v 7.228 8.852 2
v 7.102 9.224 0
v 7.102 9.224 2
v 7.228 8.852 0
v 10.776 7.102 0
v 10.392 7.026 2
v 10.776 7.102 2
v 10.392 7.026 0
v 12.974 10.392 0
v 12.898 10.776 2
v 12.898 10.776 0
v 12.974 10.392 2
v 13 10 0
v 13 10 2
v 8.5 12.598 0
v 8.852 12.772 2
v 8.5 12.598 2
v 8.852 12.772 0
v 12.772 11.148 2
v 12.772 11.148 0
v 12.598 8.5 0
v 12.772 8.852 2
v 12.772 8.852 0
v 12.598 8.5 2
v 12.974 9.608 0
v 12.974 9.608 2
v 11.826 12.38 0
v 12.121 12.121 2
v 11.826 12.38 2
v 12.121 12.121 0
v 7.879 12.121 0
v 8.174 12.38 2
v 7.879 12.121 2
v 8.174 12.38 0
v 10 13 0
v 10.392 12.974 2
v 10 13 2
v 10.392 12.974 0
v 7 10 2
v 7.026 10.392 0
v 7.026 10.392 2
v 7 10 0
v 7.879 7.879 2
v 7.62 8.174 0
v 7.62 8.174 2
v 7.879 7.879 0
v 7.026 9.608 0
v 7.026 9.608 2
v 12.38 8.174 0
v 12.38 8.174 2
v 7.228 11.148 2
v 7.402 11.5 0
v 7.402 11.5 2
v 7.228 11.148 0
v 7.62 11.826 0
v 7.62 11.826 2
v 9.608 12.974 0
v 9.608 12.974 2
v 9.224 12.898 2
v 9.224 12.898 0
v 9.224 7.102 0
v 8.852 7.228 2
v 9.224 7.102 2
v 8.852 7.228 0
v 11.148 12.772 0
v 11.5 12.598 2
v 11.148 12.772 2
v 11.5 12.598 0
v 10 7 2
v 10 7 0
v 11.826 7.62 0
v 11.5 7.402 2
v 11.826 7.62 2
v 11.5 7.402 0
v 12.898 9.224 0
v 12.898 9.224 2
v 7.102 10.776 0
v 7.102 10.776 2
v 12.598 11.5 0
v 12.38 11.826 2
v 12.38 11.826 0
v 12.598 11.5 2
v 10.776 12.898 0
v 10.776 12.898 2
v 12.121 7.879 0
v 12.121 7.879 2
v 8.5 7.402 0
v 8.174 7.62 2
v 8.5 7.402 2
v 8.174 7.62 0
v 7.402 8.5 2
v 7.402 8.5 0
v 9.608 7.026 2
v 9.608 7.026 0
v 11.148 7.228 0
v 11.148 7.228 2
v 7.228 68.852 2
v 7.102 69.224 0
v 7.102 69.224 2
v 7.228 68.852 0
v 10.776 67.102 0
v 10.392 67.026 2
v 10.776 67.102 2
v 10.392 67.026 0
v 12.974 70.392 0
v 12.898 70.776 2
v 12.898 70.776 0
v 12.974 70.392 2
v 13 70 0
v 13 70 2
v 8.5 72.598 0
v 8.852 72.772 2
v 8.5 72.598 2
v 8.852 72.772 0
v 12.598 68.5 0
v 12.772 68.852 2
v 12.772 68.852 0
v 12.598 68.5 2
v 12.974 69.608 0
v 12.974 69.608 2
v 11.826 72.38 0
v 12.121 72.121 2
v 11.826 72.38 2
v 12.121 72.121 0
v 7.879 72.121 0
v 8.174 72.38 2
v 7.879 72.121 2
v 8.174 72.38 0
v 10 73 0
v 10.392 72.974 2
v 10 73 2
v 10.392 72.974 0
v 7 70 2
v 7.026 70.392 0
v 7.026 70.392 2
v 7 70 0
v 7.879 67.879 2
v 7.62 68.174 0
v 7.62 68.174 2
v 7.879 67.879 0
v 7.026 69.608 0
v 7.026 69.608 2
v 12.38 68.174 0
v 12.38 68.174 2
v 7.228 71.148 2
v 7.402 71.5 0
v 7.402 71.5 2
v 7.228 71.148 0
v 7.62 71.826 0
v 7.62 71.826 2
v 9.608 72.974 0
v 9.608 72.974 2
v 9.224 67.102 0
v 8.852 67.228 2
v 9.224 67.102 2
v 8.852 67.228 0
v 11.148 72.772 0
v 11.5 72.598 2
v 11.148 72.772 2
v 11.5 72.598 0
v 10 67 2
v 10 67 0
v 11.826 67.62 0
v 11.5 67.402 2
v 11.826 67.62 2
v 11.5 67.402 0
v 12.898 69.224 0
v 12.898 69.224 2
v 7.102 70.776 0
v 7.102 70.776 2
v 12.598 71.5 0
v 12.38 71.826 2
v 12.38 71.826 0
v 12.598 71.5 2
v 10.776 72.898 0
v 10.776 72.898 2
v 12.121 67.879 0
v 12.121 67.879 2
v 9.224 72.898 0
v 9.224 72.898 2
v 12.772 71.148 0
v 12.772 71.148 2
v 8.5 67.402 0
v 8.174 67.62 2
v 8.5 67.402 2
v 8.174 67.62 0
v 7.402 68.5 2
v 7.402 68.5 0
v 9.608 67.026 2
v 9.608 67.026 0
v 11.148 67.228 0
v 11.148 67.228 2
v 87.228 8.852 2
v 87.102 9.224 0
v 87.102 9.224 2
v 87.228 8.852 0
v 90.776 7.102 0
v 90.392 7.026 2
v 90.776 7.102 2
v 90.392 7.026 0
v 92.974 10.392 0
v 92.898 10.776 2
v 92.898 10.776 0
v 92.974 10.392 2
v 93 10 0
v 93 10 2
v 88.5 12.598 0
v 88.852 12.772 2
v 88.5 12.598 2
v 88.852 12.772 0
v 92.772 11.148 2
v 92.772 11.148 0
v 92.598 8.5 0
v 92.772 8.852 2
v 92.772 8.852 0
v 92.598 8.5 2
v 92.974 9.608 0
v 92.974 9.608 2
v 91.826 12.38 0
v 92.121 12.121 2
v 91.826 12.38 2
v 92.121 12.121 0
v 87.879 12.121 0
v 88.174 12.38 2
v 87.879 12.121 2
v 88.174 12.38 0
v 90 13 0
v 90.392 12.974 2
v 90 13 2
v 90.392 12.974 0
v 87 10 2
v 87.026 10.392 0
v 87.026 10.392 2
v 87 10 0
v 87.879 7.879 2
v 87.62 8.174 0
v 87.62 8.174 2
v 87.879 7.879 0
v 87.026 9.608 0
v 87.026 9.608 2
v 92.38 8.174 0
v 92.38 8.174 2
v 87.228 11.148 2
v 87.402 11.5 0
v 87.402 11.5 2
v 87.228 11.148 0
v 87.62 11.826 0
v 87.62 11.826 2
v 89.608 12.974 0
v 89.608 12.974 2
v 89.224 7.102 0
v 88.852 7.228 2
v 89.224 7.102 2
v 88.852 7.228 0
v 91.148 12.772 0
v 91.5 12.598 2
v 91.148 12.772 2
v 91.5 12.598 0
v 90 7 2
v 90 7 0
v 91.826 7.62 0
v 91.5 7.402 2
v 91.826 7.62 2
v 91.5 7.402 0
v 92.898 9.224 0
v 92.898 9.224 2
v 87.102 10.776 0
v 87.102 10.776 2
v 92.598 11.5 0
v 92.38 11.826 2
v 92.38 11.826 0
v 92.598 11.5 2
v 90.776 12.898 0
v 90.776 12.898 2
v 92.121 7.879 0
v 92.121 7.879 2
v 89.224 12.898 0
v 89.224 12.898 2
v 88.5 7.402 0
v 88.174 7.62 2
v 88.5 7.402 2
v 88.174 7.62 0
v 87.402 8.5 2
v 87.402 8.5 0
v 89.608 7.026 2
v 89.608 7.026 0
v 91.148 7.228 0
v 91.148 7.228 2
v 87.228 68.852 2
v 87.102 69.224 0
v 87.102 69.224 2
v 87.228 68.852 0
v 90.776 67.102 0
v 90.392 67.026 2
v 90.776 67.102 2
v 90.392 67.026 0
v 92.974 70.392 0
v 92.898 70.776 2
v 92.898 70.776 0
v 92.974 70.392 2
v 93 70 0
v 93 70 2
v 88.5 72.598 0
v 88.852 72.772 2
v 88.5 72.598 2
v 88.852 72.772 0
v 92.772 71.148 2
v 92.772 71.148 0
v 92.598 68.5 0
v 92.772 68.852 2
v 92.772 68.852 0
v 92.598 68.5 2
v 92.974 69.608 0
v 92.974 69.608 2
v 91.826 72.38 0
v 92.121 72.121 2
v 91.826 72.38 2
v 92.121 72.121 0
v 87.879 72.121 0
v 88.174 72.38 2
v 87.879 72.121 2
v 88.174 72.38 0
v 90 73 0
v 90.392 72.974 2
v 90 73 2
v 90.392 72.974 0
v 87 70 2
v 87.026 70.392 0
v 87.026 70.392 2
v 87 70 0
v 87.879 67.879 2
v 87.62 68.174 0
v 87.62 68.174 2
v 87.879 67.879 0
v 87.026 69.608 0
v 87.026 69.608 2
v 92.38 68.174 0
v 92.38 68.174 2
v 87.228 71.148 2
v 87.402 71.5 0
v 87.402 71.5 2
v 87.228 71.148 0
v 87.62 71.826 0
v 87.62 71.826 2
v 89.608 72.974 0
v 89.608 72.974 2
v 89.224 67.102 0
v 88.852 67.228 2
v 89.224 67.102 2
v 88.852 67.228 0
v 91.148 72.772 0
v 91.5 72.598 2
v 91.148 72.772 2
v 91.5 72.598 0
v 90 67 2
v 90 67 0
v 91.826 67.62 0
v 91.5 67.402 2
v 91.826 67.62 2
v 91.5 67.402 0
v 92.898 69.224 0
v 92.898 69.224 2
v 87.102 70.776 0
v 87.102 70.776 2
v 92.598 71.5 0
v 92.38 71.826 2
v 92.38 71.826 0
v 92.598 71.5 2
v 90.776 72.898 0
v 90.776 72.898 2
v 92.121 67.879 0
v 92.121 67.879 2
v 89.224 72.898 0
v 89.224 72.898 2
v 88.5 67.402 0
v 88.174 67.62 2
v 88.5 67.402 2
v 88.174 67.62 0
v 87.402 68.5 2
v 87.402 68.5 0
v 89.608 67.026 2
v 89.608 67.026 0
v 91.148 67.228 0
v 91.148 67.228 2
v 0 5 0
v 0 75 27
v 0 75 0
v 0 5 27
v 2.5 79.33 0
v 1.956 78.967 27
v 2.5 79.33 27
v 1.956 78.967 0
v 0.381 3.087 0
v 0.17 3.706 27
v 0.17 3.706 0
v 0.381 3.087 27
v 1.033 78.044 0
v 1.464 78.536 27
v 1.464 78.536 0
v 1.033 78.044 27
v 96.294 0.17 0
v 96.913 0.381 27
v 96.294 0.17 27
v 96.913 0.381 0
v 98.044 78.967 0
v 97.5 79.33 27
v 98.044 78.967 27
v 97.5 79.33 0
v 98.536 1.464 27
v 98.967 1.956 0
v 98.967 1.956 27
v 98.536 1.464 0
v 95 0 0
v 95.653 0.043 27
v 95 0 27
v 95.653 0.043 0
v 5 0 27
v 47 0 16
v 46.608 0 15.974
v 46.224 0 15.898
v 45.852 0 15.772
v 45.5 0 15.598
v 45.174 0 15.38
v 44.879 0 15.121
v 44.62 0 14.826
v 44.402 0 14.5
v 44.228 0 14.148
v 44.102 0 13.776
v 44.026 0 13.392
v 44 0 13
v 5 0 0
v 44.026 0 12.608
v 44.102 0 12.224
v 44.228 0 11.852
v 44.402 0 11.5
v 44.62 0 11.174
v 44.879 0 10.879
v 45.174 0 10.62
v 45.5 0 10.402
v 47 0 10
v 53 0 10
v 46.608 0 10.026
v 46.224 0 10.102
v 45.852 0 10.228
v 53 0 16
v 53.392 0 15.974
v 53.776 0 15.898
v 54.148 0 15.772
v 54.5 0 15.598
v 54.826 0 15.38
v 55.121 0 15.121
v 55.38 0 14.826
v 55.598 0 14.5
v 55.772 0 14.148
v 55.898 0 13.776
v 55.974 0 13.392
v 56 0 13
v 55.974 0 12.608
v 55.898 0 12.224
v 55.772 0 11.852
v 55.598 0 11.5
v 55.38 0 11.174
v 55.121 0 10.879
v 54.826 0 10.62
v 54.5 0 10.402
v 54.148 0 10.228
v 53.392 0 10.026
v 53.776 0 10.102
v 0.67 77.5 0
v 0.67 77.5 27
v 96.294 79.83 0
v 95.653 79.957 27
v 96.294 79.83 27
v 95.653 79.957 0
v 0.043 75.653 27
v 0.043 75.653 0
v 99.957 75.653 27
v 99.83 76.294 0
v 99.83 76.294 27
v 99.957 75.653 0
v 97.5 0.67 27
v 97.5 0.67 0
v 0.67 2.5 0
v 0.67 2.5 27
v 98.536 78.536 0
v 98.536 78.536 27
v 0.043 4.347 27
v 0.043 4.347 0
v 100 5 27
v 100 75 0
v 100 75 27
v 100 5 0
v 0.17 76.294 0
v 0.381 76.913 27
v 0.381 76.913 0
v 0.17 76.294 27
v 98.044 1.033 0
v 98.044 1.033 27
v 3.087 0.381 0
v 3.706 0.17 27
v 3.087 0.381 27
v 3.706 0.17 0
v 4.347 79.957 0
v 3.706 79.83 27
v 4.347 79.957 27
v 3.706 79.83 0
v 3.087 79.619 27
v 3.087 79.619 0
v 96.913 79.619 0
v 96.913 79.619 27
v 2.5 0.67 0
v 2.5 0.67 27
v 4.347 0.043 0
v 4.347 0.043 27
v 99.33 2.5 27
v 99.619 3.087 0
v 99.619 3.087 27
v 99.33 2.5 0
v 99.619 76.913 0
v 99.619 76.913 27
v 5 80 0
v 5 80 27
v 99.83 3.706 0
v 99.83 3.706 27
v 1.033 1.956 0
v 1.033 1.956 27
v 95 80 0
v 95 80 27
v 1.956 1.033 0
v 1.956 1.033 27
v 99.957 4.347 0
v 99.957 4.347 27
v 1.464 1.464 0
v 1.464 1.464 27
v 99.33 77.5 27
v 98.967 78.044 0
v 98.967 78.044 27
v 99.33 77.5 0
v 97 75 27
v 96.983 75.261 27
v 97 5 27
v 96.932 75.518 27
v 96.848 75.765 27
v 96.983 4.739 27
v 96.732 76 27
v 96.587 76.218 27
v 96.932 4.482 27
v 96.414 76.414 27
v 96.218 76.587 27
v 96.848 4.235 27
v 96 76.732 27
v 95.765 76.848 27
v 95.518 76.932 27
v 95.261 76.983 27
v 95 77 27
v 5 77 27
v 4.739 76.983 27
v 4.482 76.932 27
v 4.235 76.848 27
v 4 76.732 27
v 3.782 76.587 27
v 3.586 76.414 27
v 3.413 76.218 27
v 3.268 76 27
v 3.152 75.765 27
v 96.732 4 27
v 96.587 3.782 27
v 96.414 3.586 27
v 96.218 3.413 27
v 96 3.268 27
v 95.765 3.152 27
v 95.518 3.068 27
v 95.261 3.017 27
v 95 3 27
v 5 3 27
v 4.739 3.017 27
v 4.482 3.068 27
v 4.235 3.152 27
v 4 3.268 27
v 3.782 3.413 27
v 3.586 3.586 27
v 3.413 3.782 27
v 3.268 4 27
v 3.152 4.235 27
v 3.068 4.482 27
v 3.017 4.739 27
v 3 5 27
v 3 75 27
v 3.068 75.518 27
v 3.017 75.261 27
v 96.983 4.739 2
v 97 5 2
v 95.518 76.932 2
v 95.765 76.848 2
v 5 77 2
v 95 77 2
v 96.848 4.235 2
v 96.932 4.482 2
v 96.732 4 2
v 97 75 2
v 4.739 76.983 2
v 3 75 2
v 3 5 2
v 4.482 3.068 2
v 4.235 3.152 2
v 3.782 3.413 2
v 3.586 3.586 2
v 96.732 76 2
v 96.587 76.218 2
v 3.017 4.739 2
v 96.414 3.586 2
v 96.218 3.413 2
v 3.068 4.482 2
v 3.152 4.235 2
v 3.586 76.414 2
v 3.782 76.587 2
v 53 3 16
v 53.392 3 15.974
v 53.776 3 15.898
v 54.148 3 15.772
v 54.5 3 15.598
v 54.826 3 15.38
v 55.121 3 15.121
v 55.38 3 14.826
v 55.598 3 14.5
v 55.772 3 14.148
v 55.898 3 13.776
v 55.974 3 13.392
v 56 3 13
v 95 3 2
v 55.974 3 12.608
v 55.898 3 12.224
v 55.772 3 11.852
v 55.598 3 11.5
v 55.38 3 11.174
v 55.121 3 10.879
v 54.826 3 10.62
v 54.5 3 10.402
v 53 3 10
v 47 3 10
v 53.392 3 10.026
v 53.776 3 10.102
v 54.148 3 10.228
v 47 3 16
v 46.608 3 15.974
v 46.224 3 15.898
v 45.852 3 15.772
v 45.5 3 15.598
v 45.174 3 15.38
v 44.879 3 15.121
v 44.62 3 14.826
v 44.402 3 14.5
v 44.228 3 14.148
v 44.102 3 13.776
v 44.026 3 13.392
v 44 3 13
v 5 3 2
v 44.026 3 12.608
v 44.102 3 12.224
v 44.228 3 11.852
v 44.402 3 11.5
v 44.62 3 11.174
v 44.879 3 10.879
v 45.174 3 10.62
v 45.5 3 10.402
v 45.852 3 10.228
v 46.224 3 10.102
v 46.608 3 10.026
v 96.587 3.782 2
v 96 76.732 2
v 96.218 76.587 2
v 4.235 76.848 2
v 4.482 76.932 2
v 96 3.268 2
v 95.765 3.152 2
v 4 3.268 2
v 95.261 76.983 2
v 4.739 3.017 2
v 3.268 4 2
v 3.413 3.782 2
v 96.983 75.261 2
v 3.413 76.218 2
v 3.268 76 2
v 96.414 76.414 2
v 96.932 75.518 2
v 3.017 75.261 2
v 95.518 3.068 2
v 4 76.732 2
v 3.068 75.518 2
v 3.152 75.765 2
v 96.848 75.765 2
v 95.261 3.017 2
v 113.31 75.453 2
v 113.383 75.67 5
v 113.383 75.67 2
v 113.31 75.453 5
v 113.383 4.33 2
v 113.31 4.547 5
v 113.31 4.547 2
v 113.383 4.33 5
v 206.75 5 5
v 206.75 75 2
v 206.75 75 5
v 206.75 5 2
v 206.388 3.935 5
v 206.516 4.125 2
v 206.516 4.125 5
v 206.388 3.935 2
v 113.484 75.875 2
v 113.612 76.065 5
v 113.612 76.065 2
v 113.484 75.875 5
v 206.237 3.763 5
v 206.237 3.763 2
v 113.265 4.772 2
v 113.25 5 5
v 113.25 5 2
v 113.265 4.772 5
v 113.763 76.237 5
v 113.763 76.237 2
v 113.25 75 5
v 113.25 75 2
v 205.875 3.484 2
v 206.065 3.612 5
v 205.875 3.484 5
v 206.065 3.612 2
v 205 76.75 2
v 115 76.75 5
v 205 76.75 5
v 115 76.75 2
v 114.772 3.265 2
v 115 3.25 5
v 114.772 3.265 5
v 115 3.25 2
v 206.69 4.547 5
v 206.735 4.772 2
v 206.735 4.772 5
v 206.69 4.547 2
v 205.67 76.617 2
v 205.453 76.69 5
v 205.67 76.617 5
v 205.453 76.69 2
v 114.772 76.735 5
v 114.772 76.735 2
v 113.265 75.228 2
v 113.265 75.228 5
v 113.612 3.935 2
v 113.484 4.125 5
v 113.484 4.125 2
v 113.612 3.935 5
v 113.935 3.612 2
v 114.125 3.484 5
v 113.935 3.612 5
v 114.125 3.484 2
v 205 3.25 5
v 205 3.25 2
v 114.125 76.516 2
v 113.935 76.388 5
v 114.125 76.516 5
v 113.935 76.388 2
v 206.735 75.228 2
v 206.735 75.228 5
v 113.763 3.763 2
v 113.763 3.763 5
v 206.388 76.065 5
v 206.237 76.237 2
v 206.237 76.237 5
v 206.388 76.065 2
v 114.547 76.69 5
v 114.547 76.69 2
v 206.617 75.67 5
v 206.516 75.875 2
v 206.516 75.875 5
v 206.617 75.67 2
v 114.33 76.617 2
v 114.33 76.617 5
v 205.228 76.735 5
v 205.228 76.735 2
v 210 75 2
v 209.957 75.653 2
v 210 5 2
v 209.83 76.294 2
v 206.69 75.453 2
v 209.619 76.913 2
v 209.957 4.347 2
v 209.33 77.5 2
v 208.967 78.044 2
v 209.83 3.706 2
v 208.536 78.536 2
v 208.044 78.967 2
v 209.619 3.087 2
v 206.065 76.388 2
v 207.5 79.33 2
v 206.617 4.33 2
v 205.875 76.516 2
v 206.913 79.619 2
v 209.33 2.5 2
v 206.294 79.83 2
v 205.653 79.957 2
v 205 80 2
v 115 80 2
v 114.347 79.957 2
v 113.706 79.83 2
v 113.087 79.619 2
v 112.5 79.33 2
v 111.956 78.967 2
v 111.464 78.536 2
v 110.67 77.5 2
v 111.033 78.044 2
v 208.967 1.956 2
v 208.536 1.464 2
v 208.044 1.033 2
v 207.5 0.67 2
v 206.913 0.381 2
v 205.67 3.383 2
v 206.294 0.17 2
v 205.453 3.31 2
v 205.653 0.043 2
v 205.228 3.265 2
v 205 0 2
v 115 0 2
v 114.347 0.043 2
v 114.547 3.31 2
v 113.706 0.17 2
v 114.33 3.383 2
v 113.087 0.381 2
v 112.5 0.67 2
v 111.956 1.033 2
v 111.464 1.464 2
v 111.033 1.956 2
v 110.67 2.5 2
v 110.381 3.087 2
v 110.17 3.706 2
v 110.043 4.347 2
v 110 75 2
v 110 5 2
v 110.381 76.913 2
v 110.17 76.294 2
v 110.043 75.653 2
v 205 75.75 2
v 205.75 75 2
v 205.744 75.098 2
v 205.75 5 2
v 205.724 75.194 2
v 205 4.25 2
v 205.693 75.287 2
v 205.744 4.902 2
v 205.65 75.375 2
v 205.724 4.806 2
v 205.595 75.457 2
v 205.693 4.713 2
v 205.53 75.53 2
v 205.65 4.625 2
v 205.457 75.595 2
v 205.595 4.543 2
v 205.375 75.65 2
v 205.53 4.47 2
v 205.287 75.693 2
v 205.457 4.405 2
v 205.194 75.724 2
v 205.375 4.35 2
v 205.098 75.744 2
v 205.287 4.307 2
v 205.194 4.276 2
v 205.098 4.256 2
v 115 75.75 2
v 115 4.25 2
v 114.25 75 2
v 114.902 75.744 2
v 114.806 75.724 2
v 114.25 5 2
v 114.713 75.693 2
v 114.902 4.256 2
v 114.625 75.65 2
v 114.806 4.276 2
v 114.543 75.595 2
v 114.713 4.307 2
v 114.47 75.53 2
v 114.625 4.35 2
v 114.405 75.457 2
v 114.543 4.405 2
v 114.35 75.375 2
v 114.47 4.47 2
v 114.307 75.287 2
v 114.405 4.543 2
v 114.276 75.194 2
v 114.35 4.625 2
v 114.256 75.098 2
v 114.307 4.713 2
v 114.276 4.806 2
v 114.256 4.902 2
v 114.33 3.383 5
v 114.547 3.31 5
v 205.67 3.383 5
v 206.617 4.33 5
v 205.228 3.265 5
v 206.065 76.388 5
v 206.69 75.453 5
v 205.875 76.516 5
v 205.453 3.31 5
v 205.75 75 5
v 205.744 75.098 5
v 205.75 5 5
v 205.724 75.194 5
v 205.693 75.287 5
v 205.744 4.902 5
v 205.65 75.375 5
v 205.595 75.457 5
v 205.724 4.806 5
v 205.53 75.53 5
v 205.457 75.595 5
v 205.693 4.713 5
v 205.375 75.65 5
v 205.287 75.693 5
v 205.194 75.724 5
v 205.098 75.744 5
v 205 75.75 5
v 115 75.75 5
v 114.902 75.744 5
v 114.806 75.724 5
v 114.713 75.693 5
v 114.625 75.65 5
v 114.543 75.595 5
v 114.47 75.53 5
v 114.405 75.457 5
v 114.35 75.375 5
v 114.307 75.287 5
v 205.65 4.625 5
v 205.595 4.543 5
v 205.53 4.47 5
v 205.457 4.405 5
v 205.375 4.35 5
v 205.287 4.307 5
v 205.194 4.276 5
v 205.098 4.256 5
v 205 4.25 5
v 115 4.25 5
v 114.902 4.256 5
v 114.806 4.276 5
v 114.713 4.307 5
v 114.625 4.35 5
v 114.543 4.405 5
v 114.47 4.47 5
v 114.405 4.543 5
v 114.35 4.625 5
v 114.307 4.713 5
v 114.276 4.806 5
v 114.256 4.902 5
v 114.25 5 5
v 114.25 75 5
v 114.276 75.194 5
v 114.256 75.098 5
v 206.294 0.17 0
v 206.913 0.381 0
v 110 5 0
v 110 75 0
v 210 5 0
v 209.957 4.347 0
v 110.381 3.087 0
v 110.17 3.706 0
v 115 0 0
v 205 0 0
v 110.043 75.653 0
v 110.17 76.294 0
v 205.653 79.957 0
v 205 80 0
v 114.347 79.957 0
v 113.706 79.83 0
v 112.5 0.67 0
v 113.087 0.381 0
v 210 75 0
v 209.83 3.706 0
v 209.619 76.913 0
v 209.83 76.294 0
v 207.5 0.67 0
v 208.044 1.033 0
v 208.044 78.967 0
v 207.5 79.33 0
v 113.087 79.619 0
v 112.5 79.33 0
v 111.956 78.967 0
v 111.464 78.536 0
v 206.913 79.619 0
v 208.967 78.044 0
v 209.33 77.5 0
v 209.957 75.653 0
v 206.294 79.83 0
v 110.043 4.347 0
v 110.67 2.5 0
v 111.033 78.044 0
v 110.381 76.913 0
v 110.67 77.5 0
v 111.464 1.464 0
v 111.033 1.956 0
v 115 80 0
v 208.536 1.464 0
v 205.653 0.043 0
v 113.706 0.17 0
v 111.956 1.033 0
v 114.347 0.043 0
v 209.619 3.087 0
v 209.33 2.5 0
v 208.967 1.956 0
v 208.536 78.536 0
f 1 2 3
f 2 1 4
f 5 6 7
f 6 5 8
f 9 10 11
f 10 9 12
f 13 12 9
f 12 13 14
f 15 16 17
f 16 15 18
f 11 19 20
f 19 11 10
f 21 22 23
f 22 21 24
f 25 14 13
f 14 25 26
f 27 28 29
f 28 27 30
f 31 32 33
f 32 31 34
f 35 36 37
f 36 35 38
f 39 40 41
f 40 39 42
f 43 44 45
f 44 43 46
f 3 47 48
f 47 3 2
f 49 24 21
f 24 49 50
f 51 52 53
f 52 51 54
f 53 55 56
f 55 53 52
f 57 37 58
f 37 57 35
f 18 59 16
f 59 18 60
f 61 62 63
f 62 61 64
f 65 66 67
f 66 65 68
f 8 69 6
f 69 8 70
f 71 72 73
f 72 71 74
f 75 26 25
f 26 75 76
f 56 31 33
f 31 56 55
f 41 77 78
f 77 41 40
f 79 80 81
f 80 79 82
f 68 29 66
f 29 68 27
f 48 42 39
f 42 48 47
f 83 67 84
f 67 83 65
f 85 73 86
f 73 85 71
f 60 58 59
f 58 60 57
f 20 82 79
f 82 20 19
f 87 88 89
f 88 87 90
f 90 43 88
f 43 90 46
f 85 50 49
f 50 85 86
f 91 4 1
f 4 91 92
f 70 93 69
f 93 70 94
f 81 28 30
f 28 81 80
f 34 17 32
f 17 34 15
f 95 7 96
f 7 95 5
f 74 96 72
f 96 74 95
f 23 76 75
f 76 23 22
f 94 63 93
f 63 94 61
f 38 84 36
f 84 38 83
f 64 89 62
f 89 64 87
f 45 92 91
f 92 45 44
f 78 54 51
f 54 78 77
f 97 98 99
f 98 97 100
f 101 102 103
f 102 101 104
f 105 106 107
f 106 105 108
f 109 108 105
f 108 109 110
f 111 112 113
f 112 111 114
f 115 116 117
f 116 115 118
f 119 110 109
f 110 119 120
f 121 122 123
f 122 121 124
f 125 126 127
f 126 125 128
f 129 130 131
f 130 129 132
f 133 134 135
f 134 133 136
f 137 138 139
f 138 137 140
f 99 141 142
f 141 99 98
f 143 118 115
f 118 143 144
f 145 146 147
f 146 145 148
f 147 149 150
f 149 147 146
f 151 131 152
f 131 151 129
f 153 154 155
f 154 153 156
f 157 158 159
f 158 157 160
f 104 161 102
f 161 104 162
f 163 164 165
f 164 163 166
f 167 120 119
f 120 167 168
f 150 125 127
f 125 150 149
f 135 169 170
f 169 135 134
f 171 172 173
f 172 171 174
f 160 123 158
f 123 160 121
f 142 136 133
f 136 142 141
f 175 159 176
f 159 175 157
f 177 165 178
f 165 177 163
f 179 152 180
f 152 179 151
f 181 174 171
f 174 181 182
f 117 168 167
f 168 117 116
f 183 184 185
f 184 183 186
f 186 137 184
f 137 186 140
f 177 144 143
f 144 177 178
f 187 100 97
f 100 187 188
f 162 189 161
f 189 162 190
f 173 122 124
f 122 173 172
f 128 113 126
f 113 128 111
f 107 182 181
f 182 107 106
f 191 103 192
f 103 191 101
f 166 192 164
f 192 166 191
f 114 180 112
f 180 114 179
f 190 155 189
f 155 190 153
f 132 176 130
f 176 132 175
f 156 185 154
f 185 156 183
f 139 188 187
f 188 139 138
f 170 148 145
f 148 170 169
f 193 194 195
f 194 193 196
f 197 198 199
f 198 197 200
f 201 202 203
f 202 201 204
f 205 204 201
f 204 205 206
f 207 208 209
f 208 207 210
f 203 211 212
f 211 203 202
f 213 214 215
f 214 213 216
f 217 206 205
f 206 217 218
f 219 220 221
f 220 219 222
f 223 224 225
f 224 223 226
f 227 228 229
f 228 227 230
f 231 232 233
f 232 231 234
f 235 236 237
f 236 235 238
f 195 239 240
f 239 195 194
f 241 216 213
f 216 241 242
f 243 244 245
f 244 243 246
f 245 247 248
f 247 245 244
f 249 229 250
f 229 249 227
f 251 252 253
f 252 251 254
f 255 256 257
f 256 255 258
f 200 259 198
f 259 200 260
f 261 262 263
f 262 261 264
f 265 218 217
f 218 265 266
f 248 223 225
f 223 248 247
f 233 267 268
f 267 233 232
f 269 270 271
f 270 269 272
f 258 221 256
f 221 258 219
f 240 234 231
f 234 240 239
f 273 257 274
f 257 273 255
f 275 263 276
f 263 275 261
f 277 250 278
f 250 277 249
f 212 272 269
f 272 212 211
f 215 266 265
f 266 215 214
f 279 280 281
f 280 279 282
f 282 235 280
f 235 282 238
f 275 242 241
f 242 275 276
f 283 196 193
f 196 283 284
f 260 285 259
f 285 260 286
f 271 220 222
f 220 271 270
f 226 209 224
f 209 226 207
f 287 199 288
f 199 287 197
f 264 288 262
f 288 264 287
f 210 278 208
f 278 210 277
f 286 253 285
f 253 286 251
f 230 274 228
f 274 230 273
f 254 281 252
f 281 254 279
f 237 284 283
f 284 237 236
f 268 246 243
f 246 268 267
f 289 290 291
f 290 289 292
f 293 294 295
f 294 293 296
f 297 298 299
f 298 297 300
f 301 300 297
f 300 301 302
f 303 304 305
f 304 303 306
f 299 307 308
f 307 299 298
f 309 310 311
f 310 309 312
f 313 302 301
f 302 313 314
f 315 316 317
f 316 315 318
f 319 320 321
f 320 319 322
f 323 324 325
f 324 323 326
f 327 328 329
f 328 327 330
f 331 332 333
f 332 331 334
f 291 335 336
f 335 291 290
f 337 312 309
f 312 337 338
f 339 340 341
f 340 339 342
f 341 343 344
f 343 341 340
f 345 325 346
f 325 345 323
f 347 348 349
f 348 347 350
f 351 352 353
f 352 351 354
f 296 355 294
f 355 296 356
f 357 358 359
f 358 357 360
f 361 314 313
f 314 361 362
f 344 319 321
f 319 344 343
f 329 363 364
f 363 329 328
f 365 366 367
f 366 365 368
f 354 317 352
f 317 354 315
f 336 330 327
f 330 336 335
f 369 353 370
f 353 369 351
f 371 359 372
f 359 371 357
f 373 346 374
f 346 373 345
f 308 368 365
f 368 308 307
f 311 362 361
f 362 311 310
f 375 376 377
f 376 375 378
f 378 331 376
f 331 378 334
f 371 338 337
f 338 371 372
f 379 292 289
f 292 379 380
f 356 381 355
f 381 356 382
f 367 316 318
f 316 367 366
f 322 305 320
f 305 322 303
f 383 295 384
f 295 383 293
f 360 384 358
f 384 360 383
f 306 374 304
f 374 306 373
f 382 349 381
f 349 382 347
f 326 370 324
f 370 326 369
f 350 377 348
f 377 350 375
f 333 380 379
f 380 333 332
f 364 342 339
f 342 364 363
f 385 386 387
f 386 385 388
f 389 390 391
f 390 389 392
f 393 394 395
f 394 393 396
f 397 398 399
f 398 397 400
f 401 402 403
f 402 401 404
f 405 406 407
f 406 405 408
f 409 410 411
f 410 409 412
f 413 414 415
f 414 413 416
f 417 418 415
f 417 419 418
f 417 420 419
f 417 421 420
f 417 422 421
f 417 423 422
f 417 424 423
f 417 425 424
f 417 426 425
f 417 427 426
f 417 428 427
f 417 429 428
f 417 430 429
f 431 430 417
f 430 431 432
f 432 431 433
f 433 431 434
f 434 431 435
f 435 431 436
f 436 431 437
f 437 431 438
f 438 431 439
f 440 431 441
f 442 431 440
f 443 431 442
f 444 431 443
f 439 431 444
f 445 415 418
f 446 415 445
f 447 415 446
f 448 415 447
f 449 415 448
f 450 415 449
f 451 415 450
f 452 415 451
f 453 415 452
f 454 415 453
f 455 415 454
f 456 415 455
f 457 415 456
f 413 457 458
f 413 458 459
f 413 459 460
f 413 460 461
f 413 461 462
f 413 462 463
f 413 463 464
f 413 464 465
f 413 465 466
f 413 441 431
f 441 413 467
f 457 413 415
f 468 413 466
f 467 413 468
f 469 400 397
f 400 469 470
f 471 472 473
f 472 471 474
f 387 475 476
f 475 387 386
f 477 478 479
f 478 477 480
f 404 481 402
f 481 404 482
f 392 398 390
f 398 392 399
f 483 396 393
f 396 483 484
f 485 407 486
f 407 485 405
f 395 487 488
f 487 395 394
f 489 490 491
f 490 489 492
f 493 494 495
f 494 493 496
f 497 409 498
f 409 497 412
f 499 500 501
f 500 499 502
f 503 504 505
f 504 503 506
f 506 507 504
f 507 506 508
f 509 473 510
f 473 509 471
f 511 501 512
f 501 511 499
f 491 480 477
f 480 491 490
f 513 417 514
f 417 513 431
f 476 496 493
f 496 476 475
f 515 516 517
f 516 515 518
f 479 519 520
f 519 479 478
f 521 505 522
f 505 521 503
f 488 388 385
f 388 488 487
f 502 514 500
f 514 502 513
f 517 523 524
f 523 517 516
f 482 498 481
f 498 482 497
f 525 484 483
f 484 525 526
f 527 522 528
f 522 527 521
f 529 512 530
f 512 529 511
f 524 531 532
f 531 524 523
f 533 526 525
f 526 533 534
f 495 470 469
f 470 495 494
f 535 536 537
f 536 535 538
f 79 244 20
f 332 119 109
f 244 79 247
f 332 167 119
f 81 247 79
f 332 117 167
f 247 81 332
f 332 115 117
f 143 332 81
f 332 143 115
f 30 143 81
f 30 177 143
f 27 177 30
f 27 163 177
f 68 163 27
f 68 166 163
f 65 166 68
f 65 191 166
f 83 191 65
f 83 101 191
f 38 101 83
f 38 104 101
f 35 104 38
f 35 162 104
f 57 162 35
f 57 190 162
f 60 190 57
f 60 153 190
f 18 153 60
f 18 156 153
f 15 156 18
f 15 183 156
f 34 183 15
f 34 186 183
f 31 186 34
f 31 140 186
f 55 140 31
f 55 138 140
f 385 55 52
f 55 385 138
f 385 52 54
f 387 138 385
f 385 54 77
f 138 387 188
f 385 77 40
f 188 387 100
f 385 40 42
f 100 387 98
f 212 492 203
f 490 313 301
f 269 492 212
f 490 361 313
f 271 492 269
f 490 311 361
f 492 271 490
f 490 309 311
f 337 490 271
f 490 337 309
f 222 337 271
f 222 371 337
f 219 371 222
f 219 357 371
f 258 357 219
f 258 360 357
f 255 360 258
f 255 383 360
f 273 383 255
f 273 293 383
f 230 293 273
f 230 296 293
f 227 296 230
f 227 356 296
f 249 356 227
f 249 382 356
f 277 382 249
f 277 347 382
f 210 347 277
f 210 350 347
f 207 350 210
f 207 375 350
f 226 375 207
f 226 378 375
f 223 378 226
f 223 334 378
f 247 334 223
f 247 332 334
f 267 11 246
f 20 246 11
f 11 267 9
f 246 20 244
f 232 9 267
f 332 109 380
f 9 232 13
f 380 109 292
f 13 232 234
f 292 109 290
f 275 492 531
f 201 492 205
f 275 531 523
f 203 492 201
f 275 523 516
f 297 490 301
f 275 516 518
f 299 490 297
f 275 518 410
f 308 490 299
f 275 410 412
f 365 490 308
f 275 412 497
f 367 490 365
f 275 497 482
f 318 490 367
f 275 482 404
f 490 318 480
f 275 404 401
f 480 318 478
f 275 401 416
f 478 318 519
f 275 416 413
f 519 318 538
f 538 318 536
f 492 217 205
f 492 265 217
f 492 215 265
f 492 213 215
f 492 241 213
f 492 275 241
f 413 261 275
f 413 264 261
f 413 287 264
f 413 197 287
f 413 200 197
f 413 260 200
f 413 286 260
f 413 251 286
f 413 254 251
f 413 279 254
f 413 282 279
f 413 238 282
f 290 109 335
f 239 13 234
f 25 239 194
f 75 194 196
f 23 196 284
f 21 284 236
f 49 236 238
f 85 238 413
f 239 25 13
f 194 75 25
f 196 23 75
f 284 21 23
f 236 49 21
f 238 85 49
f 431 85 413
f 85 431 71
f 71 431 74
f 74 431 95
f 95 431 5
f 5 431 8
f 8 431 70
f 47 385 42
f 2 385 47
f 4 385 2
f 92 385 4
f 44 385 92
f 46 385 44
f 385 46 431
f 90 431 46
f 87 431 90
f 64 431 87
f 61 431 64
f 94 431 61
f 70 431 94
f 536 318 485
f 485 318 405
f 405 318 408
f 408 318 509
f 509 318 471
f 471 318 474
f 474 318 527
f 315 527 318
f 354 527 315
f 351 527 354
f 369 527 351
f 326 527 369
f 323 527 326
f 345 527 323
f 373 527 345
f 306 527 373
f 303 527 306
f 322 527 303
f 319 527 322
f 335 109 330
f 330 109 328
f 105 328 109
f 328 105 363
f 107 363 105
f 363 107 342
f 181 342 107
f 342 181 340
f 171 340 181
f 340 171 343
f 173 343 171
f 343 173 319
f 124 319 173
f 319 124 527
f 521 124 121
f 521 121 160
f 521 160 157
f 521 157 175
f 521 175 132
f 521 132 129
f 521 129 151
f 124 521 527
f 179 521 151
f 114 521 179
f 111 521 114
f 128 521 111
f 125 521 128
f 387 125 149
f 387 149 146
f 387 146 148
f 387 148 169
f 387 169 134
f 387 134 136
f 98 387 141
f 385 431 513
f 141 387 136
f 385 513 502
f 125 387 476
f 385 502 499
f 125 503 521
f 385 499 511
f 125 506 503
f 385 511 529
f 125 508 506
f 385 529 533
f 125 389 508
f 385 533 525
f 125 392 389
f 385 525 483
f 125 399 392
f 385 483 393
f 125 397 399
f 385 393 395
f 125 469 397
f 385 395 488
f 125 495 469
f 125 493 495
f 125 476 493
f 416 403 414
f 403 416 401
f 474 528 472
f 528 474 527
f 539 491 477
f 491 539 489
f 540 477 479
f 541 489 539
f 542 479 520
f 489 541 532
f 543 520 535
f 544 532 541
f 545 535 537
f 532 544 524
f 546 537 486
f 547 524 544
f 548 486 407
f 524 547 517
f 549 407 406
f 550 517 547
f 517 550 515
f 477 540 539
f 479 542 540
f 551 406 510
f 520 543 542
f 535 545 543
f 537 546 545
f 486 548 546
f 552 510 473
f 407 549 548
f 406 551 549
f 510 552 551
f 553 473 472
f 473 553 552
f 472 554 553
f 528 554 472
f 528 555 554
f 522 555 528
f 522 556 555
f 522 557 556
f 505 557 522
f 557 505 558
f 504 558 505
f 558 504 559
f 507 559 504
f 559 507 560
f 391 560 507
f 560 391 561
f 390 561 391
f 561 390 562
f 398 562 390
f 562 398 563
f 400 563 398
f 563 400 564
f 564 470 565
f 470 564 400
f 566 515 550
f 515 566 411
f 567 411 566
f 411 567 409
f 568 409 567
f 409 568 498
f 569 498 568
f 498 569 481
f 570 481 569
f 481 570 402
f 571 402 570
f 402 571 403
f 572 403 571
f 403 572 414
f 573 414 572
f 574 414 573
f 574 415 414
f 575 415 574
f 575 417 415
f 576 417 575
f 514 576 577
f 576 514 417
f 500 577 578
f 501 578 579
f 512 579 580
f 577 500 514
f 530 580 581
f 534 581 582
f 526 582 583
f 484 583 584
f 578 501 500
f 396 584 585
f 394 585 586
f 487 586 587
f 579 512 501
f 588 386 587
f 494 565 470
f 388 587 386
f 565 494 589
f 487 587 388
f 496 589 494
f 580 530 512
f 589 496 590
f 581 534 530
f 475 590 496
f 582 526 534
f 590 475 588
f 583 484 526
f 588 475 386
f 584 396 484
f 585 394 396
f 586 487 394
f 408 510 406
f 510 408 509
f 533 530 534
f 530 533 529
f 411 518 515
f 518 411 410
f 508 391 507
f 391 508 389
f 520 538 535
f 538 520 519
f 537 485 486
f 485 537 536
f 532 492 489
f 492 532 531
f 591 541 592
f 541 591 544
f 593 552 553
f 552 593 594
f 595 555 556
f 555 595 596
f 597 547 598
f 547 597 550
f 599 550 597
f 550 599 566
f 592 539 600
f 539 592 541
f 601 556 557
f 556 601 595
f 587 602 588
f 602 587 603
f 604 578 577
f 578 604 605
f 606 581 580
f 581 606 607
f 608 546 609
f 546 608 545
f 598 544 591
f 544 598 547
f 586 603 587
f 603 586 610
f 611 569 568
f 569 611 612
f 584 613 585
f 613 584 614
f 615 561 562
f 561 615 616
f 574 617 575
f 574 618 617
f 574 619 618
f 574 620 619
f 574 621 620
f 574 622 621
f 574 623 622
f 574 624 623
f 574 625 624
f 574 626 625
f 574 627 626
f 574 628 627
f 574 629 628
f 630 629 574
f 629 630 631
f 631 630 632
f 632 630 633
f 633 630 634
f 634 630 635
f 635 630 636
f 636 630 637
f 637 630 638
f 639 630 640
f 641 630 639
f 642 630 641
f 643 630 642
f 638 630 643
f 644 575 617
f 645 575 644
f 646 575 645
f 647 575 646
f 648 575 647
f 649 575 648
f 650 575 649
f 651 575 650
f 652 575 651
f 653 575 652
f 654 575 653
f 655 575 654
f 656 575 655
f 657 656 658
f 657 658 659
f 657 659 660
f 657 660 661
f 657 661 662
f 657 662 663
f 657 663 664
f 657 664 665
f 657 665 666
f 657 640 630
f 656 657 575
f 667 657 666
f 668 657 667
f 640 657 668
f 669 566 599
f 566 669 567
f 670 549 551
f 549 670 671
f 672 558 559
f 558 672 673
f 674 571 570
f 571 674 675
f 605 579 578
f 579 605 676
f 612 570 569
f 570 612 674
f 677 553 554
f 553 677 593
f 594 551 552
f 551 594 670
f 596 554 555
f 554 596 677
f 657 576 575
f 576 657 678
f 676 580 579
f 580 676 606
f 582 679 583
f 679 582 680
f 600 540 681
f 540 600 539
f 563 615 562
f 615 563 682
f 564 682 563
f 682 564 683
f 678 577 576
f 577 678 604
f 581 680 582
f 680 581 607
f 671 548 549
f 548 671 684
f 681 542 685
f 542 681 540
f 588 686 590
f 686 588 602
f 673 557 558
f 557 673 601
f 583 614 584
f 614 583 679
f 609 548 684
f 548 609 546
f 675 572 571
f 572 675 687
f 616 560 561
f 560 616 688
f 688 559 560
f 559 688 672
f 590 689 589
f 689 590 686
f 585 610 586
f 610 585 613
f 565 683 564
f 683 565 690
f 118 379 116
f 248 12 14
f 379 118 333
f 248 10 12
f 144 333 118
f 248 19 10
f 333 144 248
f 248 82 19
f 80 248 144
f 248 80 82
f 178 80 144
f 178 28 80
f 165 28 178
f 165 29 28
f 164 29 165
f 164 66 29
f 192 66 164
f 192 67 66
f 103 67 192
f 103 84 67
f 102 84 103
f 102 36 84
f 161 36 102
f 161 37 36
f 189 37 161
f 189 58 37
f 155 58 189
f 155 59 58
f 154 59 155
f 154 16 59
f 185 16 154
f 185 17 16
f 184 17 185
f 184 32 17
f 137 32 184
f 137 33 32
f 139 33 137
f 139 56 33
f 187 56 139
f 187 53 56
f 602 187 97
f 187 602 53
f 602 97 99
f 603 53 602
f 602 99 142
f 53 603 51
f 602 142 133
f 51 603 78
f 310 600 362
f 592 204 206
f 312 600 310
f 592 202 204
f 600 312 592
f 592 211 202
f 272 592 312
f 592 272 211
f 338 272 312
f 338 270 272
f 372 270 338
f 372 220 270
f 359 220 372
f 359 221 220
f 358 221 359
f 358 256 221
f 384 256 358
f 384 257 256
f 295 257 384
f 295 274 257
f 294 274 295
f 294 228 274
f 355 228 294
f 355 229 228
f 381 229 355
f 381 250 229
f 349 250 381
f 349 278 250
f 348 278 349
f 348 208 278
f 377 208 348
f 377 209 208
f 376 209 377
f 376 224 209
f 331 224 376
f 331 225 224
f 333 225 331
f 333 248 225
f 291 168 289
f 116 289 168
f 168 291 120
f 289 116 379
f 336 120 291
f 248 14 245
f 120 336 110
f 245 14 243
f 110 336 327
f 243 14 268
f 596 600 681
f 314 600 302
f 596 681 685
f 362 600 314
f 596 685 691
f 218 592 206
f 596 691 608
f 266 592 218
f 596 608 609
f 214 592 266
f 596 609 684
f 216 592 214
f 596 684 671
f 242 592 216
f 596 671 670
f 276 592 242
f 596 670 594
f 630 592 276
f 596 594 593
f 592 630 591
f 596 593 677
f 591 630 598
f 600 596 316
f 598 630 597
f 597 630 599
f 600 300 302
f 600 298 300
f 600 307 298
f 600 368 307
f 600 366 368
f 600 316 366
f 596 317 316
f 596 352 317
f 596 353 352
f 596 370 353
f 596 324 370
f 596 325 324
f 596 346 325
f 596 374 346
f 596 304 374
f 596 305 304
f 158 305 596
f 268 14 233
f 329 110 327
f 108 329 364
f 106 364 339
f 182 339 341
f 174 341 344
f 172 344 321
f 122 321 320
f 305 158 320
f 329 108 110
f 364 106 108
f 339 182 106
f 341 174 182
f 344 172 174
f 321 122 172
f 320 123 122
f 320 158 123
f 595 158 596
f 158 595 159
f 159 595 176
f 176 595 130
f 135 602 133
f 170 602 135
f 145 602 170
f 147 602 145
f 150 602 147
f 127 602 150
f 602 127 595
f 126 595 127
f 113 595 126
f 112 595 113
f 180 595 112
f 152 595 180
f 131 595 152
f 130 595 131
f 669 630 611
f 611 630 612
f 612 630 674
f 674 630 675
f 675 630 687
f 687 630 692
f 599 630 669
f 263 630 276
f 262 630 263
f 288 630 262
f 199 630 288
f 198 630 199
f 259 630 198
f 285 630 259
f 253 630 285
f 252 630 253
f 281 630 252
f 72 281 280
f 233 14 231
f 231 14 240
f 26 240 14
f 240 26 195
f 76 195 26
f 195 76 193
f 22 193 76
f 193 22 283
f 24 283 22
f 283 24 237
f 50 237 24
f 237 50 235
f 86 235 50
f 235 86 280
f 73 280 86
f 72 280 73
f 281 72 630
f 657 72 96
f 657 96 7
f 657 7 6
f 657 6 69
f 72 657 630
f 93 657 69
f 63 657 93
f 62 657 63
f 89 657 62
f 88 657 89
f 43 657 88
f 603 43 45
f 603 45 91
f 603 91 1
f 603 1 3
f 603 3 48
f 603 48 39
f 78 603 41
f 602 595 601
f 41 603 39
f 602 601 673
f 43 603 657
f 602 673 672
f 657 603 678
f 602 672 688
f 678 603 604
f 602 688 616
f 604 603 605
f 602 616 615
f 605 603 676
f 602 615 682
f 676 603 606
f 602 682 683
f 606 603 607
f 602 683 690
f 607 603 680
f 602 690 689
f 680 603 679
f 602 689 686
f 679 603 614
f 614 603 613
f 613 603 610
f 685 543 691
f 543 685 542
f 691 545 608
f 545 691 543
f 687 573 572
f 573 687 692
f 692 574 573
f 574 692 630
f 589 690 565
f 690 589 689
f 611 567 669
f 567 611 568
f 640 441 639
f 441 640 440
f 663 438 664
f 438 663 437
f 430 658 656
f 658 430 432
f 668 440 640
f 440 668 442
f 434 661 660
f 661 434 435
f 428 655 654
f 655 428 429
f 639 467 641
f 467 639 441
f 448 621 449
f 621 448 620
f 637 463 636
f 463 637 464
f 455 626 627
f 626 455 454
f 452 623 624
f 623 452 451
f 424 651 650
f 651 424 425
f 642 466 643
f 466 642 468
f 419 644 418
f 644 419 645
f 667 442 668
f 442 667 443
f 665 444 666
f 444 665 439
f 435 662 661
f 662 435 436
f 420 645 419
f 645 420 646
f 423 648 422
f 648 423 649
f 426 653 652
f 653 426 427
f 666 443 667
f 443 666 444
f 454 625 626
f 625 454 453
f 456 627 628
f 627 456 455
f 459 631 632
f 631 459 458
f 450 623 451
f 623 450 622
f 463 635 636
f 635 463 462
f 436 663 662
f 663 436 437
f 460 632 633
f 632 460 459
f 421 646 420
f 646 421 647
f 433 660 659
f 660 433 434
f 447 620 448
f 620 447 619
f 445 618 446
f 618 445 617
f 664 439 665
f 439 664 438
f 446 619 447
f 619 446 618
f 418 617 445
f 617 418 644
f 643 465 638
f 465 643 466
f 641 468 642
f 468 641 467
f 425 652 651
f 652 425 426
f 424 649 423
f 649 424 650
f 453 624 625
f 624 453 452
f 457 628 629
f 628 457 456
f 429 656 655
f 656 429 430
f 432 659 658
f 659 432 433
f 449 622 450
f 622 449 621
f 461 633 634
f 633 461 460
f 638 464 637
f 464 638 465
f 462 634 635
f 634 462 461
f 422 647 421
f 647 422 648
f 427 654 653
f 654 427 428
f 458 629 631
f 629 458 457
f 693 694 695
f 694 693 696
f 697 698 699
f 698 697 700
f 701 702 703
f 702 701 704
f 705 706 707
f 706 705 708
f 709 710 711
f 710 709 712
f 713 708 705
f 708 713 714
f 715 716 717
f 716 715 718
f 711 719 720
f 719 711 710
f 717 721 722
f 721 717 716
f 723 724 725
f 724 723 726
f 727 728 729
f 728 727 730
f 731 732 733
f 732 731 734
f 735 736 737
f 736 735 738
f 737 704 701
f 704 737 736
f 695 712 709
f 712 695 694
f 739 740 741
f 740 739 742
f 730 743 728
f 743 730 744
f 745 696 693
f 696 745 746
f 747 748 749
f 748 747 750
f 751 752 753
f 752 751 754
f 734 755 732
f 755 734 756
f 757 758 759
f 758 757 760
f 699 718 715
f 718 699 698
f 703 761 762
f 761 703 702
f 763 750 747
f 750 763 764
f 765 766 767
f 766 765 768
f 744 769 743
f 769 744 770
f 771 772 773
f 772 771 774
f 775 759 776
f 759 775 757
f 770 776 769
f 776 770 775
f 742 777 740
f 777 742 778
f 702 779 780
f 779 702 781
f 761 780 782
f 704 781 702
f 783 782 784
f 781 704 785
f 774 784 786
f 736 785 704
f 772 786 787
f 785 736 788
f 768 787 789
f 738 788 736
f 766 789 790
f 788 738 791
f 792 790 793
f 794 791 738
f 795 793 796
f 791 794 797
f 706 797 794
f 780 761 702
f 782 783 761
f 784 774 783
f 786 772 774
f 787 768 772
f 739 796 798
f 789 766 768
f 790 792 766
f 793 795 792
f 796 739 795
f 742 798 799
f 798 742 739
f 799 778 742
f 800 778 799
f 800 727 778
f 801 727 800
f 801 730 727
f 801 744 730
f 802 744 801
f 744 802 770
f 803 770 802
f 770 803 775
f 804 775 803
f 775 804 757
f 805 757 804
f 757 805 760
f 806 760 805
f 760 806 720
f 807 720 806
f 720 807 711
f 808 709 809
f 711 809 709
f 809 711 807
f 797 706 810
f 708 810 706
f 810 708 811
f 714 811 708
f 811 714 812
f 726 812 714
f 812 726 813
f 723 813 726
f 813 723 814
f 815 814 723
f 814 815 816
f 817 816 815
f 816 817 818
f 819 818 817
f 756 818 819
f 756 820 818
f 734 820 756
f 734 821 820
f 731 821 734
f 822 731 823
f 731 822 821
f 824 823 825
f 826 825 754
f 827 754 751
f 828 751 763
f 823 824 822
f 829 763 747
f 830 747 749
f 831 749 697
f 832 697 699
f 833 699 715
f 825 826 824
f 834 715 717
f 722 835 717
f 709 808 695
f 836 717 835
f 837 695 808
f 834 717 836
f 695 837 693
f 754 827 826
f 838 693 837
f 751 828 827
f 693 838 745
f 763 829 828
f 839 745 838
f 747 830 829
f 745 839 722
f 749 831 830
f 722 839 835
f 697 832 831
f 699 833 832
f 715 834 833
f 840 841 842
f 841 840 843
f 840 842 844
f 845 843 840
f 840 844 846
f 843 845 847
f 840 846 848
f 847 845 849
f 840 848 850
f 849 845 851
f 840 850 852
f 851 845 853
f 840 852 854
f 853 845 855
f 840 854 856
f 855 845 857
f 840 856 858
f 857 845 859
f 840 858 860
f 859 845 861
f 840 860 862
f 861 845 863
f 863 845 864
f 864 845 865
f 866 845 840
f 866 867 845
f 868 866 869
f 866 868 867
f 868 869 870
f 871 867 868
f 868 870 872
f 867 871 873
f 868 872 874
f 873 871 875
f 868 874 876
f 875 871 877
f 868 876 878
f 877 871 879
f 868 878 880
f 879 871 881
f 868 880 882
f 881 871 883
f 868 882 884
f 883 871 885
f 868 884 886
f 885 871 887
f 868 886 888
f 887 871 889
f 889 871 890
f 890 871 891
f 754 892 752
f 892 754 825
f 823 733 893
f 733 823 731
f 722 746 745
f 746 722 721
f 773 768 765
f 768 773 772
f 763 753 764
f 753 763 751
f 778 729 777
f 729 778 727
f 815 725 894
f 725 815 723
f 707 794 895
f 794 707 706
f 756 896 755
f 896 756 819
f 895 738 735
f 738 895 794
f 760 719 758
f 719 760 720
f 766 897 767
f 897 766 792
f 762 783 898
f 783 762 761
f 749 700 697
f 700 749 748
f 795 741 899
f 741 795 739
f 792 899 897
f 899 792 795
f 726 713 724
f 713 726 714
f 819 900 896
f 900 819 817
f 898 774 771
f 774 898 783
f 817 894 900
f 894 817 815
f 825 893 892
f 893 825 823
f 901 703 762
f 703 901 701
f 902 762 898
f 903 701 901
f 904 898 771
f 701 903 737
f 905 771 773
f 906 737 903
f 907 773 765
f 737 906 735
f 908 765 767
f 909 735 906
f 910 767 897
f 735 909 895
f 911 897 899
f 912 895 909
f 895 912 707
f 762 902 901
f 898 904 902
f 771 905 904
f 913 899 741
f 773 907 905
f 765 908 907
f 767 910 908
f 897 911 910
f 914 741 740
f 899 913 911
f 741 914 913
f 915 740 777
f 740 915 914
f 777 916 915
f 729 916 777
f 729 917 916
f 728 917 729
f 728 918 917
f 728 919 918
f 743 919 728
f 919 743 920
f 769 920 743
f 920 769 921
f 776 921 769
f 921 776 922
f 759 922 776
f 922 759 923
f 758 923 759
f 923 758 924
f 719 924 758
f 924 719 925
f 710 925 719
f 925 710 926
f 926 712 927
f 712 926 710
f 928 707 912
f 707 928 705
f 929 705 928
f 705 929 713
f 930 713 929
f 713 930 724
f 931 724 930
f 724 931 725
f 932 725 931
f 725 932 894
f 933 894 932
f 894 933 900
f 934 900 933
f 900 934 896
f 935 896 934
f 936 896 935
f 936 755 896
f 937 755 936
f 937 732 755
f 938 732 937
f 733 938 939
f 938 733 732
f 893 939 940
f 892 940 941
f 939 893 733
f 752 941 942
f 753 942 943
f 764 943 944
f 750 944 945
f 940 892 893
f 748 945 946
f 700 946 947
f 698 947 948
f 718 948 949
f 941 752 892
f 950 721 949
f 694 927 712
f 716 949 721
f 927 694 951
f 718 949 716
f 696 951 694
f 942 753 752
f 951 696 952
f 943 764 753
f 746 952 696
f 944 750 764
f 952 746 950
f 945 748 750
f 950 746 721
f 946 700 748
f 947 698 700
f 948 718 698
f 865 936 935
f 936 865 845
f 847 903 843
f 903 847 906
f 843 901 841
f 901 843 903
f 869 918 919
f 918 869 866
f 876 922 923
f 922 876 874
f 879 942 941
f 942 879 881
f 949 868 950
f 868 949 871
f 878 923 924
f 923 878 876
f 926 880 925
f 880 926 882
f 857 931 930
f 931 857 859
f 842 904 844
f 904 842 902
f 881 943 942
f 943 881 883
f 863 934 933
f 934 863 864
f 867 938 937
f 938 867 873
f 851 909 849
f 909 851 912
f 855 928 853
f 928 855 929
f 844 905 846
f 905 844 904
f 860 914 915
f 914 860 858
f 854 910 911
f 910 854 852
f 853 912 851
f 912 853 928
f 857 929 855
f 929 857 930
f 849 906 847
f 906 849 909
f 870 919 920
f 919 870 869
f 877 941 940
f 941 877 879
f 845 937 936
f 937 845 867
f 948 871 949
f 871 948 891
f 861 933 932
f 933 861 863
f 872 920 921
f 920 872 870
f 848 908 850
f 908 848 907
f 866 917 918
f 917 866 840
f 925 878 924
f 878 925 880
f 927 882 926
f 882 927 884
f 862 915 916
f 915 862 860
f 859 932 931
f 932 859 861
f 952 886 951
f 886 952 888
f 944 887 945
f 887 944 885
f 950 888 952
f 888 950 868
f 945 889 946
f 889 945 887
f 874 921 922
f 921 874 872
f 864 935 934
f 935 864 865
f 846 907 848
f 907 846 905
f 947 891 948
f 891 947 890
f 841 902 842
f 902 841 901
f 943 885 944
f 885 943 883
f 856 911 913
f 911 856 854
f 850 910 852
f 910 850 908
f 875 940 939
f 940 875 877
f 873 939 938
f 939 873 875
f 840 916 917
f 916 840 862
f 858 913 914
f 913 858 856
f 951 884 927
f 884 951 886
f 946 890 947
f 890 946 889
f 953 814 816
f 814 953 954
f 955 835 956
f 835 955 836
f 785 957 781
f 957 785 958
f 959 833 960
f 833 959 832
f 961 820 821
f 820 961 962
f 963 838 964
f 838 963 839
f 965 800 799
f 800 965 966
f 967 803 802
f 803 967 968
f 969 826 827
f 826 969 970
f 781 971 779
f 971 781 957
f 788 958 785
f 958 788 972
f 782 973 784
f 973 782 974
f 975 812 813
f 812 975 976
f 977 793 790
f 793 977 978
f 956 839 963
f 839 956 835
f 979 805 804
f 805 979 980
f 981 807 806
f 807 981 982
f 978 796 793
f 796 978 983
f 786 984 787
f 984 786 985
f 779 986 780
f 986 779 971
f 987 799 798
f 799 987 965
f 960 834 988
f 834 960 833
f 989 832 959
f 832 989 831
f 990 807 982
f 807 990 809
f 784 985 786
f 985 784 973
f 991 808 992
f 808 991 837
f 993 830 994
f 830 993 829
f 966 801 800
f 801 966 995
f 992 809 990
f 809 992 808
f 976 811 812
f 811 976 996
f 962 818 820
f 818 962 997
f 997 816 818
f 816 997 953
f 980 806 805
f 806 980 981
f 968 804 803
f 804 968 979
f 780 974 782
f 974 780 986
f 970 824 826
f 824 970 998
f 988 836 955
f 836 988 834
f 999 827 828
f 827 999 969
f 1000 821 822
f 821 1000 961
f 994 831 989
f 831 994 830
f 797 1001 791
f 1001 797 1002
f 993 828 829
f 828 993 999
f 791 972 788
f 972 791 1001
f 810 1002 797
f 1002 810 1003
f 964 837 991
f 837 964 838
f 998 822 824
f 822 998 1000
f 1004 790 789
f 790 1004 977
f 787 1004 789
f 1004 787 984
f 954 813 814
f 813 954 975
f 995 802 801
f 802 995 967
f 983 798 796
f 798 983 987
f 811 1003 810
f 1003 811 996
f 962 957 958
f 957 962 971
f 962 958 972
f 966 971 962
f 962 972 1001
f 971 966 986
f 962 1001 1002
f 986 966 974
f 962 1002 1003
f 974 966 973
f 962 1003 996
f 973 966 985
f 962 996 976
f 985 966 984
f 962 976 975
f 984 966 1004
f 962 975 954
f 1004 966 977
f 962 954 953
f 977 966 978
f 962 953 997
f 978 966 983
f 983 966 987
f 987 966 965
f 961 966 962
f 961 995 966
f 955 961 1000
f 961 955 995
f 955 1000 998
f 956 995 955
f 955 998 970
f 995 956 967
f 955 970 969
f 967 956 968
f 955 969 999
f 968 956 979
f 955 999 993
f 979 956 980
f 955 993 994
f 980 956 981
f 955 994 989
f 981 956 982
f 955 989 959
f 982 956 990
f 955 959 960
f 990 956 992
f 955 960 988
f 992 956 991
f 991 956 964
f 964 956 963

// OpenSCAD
// Dimensions in millimetres
length = 100;
width = 80;
height = 27;
wall = 3;
base = 2;
corner_radius = 5;
hole_diameter = 6;
hole_inset = 10;

slot_length = 12;
slot_height = 6;
slot_bottom_above_floor = 8;

lid_thickness = 2;
lip_thickness = 1;
lip_depth = 3;
lip_clearance = 0.25; // per side
part_gap = 10;

$fn = 48;

module rounded_block(l, w, h, r) {
    hull() {
        for (x = [r, l-r])
            for (y = [r, w-r])
                translate([x, y, 0])
                    cylinder(h = h, r = r);
    }
}

module box() {
    difference() {
        rounded_block(length, width, height, corner_radius);

        // Interior follows the outside corners for uniform walls.
        translate([wall, wall, base])
            rounded_block(length - 2*wall, width - 2*wall,
                          height - base + 1, corner_radius - wall);

        for (x = [hole_inset, length - hole_inset])
            for (y = [hole_inset, width - hole_inset])
                translate([x, y, -1])
                    cylinder(h = base + 2, d = hole_diameter);

        // Horizontal capsule slot through the long wall at y = 0.
        hull() {
            for (x = [length/2 - (slot_length - slot_height)/2,
                      length/2 + (slot_length - slot_height)/2])
                translate([x, wall + 1,
                           base + slot_bottom_above_floor + slot_height/2])
                    rotate([90, 0, 0])
                        cylinder(h = wall + 2, d = slot_height);
        }
    }
}

module lid() {
    lip_offset = wall + lip_clearance;
    lip_length = length - 2*lip_offset;
    lip_width = width - 2*lip_offset;
    lip_radius = corner_radius - lip_offset;

    rounded_block(length, width, lid_thickness, corner_radius);

    // Lip faces upward for printing; flip the lid to fit it on the box.
    translate([lip_offset, lip_offset, lid_thickness])
        difference() {
            rounded_block(lip_length, lip_width, lip_depth, lip_radius);
            translate([lip_thickness, lip_thickness, -1])
                rounded_block(lip_length - 2*lip_thickness,
                              lip_width - 2*lip_thickness,
                              lip_depth + 2, lip_radius - lip_thickness);
        }
}

box();
translate([length + part_gap, 0, 0]) lid();
